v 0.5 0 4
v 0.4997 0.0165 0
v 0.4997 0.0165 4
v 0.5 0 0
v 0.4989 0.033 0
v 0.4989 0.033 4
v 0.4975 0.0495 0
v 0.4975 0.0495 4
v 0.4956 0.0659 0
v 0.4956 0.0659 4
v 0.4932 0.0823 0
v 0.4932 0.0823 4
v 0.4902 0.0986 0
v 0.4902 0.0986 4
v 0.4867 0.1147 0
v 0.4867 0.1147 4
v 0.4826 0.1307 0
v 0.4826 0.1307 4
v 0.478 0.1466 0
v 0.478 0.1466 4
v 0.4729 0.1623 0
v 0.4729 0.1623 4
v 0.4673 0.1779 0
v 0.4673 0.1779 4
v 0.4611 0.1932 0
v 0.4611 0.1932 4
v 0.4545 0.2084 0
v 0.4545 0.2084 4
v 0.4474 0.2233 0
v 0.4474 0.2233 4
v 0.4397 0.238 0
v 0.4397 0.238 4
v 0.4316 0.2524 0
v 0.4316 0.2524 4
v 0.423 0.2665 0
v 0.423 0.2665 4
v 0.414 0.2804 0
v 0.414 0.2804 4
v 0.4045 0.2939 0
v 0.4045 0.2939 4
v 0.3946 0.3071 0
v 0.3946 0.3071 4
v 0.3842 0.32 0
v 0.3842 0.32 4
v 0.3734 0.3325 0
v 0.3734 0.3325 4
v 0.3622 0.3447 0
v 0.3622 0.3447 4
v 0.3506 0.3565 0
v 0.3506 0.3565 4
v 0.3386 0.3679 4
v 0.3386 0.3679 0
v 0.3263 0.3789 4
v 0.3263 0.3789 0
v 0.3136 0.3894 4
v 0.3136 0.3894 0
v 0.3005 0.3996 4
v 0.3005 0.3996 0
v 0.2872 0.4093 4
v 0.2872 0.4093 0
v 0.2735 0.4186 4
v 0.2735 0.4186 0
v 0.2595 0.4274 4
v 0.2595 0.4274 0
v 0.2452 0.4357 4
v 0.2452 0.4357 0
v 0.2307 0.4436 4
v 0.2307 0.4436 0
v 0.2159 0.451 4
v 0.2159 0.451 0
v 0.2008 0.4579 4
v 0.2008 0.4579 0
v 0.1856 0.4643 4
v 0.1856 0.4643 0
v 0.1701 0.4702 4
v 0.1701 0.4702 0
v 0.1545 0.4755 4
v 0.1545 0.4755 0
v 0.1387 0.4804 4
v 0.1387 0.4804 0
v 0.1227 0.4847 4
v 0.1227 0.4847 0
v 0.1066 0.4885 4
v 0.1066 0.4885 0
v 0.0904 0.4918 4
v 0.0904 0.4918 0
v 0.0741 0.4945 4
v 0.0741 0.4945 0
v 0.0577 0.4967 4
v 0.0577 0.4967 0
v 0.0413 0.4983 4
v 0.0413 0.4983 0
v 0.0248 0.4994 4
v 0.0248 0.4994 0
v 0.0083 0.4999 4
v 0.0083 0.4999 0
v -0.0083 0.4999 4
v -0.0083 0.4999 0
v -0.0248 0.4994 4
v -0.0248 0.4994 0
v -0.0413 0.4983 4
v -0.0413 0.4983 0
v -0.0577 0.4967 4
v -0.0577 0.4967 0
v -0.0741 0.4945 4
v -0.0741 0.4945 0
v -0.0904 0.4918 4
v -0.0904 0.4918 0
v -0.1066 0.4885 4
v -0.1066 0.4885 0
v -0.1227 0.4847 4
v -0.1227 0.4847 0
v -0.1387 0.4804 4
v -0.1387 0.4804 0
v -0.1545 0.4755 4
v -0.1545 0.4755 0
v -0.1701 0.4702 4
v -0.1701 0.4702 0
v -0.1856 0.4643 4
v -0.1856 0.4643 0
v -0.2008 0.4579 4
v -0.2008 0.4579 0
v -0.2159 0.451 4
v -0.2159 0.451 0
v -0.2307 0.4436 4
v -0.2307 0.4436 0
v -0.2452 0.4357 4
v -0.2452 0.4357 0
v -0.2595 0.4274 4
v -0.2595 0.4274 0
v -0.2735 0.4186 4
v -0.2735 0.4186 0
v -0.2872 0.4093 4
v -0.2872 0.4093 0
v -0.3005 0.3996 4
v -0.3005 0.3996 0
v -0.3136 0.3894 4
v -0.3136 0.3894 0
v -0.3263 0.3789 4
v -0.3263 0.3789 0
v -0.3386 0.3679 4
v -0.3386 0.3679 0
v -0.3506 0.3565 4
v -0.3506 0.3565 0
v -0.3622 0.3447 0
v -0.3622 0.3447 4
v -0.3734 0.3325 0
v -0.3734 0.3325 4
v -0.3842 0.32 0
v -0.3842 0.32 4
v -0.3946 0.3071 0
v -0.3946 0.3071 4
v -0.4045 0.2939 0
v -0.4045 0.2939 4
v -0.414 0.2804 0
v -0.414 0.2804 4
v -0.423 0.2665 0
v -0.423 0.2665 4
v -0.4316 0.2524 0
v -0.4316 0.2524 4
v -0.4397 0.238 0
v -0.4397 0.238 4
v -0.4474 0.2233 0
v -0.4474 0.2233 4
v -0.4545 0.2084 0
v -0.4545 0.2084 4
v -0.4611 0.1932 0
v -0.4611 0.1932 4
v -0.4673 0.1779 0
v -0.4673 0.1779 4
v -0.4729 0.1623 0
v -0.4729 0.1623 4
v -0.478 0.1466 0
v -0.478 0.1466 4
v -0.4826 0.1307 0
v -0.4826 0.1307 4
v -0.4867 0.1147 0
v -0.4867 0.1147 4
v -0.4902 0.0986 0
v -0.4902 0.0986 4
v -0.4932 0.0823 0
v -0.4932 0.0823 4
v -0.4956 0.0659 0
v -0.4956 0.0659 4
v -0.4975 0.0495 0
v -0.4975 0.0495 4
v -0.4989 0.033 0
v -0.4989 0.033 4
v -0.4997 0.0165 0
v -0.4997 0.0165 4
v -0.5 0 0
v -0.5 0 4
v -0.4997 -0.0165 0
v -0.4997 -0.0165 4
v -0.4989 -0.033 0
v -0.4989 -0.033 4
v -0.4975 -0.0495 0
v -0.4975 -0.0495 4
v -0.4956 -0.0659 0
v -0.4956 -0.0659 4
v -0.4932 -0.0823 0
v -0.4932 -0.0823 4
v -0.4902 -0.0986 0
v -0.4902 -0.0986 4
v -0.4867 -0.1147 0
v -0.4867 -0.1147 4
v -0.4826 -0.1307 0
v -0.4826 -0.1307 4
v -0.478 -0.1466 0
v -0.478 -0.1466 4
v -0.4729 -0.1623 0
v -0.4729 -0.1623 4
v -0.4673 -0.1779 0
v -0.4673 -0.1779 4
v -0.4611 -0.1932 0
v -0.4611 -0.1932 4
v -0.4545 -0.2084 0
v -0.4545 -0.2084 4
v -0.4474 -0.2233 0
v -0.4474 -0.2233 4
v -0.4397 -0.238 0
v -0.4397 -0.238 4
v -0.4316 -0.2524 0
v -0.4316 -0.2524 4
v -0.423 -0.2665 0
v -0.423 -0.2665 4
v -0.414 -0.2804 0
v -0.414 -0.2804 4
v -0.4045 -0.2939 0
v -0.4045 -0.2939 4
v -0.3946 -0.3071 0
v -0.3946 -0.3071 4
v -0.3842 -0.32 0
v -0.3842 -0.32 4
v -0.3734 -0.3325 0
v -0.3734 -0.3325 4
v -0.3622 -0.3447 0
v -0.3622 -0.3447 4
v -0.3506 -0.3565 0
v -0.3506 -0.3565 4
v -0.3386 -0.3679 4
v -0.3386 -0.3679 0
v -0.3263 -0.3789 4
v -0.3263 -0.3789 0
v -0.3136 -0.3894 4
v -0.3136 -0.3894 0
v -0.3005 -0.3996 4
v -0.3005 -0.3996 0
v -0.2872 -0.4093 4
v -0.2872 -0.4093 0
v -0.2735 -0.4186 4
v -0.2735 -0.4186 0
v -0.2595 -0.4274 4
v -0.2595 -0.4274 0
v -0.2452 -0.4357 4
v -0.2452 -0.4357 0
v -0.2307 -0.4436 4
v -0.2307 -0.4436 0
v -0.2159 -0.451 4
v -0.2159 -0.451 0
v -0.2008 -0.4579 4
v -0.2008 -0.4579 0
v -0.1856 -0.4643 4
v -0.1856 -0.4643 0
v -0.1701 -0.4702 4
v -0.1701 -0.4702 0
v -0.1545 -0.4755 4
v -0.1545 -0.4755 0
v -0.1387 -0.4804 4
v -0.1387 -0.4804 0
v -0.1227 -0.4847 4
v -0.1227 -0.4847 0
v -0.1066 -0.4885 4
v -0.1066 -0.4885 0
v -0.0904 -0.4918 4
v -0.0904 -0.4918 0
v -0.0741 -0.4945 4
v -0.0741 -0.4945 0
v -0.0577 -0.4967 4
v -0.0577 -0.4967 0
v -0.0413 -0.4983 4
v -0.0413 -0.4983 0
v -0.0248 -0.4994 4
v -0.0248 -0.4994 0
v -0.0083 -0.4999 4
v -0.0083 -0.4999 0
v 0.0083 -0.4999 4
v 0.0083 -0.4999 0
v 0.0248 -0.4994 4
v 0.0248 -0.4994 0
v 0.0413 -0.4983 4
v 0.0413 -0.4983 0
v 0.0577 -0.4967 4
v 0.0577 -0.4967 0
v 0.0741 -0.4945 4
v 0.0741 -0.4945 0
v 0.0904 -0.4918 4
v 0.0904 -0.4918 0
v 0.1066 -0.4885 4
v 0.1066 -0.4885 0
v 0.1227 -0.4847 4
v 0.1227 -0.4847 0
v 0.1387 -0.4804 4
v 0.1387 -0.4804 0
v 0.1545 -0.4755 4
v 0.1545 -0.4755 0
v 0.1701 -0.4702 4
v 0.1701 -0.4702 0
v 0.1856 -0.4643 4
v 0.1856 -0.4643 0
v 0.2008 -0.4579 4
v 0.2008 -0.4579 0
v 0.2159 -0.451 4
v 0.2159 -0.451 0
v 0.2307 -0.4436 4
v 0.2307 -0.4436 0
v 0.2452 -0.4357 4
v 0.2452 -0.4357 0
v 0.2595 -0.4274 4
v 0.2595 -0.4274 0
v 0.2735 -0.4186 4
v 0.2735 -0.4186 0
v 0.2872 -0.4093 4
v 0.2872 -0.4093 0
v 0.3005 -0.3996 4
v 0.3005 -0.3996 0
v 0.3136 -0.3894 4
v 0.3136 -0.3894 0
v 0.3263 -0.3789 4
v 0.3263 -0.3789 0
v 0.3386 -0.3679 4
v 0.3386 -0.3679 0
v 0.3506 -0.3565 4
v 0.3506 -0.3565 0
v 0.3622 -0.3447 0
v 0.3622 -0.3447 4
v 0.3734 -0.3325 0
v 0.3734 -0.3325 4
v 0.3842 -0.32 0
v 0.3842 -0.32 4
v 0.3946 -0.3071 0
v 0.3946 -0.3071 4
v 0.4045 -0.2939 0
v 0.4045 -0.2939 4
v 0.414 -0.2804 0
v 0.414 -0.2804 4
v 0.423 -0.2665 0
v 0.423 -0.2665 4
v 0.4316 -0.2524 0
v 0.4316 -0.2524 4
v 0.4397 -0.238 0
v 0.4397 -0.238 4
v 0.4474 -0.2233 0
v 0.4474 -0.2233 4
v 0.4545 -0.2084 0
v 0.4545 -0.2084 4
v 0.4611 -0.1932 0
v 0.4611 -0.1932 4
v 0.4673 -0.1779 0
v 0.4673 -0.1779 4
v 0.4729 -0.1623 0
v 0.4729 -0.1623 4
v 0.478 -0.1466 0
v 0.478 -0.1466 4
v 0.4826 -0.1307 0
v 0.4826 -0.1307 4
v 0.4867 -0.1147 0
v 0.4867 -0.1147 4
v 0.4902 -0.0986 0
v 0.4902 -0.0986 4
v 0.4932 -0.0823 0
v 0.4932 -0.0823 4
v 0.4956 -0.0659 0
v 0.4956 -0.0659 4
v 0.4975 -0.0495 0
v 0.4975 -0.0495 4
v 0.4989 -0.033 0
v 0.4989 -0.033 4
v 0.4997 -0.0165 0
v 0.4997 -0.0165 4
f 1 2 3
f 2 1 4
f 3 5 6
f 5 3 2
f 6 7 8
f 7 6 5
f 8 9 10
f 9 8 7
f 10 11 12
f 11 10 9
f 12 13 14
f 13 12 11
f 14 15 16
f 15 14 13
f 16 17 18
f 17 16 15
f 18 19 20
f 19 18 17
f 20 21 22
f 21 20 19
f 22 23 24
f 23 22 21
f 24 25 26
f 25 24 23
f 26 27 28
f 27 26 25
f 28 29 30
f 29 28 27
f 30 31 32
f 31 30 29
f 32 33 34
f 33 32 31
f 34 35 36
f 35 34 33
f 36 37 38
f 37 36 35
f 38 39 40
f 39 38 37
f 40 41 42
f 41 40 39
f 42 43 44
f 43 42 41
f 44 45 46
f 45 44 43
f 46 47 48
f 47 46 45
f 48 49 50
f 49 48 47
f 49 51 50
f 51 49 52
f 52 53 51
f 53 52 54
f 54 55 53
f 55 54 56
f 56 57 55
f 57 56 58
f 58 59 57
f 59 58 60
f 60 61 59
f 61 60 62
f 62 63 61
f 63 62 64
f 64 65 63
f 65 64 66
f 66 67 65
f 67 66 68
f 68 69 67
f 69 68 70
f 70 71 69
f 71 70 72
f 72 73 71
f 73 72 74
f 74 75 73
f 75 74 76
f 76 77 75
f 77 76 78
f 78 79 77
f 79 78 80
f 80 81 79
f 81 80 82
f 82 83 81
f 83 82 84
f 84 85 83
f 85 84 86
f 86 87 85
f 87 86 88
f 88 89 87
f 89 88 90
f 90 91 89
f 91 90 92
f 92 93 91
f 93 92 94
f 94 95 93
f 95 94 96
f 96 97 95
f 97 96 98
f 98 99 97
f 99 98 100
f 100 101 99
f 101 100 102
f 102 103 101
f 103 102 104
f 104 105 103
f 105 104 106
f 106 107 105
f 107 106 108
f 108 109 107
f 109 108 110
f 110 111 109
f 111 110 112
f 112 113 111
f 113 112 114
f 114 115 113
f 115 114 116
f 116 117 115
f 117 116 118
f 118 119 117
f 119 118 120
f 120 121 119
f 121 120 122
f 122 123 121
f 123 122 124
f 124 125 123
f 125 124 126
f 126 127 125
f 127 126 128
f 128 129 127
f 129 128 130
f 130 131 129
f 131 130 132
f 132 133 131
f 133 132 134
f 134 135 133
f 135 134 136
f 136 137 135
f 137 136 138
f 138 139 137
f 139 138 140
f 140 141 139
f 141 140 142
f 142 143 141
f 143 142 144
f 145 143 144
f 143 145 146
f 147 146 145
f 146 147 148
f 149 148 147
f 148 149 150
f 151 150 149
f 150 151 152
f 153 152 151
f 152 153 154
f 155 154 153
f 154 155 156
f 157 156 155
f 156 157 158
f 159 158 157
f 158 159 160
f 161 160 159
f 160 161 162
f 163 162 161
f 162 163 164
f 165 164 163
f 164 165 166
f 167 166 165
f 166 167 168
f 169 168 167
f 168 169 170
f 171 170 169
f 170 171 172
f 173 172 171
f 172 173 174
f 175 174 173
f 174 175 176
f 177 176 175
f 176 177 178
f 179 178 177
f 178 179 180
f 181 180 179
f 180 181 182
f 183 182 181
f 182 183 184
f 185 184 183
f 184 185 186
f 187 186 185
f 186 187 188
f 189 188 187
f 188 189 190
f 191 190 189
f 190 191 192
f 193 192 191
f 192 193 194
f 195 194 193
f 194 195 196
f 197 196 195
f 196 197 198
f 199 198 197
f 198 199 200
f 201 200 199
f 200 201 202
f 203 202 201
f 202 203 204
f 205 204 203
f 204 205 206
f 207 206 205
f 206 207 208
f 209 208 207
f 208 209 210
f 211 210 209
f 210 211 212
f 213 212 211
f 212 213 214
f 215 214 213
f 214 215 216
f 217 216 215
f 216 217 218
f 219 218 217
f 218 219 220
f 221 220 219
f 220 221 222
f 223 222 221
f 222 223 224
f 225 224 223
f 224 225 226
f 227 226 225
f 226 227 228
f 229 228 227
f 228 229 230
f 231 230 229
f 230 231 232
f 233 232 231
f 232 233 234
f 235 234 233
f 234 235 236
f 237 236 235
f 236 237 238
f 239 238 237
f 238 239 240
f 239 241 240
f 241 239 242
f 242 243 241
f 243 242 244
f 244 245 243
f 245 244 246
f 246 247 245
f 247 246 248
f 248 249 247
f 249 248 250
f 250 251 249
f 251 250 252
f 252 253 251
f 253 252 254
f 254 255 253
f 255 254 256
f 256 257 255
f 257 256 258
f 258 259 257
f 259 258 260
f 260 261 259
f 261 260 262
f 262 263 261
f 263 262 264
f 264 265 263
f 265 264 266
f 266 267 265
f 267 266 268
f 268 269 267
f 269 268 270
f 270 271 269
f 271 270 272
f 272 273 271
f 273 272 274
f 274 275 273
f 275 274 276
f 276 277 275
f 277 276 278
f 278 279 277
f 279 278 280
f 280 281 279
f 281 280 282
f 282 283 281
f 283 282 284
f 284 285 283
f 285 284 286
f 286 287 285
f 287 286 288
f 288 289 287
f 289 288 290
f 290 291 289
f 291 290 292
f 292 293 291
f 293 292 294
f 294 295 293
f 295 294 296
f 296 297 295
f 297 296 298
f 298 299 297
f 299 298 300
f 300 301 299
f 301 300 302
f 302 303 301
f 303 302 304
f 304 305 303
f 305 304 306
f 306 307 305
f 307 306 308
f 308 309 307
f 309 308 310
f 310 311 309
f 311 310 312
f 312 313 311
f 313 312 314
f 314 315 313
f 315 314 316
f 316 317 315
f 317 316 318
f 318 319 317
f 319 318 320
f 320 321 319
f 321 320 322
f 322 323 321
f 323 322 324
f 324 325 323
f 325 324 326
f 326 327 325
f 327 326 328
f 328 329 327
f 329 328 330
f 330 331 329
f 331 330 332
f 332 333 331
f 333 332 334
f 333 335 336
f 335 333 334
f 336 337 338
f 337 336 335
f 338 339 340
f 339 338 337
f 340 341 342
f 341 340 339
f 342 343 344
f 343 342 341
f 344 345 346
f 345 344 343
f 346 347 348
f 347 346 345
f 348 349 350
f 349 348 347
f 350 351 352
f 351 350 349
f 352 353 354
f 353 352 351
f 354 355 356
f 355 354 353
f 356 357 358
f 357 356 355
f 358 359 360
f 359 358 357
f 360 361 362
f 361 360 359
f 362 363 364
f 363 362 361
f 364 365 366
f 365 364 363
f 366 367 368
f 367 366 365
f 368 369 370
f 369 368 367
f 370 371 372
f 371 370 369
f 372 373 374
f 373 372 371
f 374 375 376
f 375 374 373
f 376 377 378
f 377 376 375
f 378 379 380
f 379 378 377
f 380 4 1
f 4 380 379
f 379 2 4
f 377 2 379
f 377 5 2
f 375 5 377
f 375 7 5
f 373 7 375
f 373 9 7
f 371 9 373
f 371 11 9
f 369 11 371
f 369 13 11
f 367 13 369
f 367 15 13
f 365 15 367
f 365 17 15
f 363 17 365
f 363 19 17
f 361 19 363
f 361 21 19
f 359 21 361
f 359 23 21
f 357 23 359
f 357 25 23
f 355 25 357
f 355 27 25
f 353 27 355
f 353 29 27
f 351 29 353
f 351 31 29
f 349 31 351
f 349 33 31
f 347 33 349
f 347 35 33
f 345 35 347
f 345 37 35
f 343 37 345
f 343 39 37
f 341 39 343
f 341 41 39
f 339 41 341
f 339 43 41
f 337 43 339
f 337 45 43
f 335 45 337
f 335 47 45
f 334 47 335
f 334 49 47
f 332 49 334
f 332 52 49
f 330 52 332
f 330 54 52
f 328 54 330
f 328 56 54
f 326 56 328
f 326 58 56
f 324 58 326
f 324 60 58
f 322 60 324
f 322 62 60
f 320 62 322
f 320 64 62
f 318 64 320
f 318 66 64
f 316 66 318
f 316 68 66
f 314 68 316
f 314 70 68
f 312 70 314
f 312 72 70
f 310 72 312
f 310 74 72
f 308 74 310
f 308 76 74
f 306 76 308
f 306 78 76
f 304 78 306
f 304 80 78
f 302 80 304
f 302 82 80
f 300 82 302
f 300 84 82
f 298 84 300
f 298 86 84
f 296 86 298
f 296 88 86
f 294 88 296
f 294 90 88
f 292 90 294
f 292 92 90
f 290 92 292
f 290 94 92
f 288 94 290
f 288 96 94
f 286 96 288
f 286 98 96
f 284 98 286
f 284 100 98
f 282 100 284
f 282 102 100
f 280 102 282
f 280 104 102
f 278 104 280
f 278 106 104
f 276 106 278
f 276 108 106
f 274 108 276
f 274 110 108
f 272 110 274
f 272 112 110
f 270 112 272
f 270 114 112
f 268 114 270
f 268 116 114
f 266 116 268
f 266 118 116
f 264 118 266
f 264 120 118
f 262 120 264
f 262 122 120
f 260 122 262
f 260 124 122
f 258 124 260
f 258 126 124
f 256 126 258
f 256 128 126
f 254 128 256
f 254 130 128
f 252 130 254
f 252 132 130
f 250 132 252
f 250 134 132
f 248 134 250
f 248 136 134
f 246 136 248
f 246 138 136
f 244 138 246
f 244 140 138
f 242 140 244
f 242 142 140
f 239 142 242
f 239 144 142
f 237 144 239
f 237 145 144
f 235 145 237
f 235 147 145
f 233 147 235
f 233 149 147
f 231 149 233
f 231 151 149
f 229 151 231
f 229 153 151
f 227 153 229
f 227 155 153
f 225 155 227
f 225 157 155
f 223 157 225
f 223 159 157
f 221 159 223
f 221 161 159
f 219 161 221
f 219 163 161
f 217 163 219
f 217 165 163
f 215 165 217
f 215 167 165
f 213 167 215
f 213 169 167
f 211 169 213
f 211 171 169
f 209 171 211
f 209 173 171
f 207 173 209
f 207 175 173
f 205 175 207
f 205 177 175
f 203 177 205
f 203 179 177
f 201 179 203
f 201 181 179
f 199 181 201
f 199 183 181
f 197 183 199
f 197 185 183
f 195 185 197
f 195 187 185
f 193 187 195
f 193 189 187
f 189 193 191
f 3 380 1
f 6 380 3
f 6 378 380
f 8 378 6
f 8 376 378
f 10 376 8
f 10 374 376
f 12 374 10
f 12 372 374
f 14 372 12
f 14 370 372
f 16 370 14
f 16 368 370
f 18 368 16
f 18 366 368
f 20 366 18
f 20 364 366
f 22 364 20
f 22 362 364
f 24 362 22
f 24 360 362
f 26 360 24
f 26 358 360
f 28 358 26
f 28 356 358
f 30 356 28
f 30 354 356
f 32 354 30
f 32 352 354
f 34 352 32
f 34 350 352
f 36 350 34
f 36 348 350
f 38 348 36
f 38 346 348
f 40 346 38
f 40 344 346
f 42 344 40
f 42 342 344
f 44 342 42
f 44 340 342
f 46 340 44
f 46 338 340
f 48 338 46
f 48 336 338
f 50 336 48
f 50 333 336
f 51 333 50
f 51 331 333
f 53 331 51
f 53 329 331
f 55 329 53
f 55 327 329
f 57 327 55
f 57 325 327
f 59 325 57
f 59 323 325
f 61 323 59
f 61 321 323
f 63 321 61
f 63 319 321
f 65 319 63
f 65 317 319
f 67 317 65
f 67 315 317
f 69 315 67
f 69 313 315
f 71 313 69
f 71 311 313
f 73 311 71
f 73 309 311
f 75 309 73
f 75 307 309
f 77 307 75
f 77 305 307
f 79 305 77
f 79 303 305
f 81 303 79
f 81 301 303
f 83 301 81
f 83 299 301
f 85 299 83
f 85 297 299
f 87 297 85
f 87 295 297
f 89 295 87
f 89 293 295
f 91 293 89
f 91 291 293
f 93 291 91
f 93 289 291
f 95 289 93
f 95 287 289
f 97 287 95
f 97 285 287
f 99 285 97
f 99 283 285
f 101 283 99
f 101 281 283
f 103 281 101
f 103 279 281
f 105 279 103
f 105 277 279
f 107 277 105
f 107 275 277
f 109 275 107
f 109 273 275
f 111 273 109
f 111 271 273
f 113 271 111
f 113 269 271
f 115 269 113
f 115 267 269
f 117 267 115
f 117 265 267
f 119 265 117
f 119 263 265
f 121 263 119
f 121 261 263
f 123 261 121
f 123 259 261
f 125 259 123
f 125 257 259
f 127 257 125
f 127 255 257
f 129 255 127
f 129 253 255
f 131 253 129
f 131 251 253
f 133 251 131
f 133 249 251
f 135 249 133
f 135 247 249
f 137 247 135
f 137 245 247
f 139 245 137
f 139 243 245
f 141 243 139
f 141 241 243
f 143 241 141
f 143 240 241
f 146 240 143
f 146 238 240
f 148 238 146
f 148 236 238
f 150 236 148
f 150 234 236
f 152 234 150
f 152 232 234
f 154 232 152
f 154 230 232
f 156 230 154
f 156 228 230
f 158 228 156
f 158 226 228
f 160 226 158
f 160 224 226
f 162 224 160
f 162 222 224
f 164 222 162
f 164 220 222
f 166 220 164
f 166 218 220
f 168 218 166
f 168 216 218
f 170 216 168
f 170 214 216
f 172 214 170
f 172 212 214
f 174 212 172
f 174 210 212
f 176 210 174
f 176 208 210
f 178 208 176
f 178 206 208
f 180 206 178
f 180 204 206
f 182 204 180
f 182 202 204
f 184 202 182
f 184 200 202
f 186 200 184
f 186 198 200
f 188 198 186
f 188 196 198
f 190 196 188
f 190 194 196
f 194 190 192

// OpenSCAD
n_facets=190;


 translate([0,0,0]) cylinder(r=0.5, h=4, $fn=n_facets);
